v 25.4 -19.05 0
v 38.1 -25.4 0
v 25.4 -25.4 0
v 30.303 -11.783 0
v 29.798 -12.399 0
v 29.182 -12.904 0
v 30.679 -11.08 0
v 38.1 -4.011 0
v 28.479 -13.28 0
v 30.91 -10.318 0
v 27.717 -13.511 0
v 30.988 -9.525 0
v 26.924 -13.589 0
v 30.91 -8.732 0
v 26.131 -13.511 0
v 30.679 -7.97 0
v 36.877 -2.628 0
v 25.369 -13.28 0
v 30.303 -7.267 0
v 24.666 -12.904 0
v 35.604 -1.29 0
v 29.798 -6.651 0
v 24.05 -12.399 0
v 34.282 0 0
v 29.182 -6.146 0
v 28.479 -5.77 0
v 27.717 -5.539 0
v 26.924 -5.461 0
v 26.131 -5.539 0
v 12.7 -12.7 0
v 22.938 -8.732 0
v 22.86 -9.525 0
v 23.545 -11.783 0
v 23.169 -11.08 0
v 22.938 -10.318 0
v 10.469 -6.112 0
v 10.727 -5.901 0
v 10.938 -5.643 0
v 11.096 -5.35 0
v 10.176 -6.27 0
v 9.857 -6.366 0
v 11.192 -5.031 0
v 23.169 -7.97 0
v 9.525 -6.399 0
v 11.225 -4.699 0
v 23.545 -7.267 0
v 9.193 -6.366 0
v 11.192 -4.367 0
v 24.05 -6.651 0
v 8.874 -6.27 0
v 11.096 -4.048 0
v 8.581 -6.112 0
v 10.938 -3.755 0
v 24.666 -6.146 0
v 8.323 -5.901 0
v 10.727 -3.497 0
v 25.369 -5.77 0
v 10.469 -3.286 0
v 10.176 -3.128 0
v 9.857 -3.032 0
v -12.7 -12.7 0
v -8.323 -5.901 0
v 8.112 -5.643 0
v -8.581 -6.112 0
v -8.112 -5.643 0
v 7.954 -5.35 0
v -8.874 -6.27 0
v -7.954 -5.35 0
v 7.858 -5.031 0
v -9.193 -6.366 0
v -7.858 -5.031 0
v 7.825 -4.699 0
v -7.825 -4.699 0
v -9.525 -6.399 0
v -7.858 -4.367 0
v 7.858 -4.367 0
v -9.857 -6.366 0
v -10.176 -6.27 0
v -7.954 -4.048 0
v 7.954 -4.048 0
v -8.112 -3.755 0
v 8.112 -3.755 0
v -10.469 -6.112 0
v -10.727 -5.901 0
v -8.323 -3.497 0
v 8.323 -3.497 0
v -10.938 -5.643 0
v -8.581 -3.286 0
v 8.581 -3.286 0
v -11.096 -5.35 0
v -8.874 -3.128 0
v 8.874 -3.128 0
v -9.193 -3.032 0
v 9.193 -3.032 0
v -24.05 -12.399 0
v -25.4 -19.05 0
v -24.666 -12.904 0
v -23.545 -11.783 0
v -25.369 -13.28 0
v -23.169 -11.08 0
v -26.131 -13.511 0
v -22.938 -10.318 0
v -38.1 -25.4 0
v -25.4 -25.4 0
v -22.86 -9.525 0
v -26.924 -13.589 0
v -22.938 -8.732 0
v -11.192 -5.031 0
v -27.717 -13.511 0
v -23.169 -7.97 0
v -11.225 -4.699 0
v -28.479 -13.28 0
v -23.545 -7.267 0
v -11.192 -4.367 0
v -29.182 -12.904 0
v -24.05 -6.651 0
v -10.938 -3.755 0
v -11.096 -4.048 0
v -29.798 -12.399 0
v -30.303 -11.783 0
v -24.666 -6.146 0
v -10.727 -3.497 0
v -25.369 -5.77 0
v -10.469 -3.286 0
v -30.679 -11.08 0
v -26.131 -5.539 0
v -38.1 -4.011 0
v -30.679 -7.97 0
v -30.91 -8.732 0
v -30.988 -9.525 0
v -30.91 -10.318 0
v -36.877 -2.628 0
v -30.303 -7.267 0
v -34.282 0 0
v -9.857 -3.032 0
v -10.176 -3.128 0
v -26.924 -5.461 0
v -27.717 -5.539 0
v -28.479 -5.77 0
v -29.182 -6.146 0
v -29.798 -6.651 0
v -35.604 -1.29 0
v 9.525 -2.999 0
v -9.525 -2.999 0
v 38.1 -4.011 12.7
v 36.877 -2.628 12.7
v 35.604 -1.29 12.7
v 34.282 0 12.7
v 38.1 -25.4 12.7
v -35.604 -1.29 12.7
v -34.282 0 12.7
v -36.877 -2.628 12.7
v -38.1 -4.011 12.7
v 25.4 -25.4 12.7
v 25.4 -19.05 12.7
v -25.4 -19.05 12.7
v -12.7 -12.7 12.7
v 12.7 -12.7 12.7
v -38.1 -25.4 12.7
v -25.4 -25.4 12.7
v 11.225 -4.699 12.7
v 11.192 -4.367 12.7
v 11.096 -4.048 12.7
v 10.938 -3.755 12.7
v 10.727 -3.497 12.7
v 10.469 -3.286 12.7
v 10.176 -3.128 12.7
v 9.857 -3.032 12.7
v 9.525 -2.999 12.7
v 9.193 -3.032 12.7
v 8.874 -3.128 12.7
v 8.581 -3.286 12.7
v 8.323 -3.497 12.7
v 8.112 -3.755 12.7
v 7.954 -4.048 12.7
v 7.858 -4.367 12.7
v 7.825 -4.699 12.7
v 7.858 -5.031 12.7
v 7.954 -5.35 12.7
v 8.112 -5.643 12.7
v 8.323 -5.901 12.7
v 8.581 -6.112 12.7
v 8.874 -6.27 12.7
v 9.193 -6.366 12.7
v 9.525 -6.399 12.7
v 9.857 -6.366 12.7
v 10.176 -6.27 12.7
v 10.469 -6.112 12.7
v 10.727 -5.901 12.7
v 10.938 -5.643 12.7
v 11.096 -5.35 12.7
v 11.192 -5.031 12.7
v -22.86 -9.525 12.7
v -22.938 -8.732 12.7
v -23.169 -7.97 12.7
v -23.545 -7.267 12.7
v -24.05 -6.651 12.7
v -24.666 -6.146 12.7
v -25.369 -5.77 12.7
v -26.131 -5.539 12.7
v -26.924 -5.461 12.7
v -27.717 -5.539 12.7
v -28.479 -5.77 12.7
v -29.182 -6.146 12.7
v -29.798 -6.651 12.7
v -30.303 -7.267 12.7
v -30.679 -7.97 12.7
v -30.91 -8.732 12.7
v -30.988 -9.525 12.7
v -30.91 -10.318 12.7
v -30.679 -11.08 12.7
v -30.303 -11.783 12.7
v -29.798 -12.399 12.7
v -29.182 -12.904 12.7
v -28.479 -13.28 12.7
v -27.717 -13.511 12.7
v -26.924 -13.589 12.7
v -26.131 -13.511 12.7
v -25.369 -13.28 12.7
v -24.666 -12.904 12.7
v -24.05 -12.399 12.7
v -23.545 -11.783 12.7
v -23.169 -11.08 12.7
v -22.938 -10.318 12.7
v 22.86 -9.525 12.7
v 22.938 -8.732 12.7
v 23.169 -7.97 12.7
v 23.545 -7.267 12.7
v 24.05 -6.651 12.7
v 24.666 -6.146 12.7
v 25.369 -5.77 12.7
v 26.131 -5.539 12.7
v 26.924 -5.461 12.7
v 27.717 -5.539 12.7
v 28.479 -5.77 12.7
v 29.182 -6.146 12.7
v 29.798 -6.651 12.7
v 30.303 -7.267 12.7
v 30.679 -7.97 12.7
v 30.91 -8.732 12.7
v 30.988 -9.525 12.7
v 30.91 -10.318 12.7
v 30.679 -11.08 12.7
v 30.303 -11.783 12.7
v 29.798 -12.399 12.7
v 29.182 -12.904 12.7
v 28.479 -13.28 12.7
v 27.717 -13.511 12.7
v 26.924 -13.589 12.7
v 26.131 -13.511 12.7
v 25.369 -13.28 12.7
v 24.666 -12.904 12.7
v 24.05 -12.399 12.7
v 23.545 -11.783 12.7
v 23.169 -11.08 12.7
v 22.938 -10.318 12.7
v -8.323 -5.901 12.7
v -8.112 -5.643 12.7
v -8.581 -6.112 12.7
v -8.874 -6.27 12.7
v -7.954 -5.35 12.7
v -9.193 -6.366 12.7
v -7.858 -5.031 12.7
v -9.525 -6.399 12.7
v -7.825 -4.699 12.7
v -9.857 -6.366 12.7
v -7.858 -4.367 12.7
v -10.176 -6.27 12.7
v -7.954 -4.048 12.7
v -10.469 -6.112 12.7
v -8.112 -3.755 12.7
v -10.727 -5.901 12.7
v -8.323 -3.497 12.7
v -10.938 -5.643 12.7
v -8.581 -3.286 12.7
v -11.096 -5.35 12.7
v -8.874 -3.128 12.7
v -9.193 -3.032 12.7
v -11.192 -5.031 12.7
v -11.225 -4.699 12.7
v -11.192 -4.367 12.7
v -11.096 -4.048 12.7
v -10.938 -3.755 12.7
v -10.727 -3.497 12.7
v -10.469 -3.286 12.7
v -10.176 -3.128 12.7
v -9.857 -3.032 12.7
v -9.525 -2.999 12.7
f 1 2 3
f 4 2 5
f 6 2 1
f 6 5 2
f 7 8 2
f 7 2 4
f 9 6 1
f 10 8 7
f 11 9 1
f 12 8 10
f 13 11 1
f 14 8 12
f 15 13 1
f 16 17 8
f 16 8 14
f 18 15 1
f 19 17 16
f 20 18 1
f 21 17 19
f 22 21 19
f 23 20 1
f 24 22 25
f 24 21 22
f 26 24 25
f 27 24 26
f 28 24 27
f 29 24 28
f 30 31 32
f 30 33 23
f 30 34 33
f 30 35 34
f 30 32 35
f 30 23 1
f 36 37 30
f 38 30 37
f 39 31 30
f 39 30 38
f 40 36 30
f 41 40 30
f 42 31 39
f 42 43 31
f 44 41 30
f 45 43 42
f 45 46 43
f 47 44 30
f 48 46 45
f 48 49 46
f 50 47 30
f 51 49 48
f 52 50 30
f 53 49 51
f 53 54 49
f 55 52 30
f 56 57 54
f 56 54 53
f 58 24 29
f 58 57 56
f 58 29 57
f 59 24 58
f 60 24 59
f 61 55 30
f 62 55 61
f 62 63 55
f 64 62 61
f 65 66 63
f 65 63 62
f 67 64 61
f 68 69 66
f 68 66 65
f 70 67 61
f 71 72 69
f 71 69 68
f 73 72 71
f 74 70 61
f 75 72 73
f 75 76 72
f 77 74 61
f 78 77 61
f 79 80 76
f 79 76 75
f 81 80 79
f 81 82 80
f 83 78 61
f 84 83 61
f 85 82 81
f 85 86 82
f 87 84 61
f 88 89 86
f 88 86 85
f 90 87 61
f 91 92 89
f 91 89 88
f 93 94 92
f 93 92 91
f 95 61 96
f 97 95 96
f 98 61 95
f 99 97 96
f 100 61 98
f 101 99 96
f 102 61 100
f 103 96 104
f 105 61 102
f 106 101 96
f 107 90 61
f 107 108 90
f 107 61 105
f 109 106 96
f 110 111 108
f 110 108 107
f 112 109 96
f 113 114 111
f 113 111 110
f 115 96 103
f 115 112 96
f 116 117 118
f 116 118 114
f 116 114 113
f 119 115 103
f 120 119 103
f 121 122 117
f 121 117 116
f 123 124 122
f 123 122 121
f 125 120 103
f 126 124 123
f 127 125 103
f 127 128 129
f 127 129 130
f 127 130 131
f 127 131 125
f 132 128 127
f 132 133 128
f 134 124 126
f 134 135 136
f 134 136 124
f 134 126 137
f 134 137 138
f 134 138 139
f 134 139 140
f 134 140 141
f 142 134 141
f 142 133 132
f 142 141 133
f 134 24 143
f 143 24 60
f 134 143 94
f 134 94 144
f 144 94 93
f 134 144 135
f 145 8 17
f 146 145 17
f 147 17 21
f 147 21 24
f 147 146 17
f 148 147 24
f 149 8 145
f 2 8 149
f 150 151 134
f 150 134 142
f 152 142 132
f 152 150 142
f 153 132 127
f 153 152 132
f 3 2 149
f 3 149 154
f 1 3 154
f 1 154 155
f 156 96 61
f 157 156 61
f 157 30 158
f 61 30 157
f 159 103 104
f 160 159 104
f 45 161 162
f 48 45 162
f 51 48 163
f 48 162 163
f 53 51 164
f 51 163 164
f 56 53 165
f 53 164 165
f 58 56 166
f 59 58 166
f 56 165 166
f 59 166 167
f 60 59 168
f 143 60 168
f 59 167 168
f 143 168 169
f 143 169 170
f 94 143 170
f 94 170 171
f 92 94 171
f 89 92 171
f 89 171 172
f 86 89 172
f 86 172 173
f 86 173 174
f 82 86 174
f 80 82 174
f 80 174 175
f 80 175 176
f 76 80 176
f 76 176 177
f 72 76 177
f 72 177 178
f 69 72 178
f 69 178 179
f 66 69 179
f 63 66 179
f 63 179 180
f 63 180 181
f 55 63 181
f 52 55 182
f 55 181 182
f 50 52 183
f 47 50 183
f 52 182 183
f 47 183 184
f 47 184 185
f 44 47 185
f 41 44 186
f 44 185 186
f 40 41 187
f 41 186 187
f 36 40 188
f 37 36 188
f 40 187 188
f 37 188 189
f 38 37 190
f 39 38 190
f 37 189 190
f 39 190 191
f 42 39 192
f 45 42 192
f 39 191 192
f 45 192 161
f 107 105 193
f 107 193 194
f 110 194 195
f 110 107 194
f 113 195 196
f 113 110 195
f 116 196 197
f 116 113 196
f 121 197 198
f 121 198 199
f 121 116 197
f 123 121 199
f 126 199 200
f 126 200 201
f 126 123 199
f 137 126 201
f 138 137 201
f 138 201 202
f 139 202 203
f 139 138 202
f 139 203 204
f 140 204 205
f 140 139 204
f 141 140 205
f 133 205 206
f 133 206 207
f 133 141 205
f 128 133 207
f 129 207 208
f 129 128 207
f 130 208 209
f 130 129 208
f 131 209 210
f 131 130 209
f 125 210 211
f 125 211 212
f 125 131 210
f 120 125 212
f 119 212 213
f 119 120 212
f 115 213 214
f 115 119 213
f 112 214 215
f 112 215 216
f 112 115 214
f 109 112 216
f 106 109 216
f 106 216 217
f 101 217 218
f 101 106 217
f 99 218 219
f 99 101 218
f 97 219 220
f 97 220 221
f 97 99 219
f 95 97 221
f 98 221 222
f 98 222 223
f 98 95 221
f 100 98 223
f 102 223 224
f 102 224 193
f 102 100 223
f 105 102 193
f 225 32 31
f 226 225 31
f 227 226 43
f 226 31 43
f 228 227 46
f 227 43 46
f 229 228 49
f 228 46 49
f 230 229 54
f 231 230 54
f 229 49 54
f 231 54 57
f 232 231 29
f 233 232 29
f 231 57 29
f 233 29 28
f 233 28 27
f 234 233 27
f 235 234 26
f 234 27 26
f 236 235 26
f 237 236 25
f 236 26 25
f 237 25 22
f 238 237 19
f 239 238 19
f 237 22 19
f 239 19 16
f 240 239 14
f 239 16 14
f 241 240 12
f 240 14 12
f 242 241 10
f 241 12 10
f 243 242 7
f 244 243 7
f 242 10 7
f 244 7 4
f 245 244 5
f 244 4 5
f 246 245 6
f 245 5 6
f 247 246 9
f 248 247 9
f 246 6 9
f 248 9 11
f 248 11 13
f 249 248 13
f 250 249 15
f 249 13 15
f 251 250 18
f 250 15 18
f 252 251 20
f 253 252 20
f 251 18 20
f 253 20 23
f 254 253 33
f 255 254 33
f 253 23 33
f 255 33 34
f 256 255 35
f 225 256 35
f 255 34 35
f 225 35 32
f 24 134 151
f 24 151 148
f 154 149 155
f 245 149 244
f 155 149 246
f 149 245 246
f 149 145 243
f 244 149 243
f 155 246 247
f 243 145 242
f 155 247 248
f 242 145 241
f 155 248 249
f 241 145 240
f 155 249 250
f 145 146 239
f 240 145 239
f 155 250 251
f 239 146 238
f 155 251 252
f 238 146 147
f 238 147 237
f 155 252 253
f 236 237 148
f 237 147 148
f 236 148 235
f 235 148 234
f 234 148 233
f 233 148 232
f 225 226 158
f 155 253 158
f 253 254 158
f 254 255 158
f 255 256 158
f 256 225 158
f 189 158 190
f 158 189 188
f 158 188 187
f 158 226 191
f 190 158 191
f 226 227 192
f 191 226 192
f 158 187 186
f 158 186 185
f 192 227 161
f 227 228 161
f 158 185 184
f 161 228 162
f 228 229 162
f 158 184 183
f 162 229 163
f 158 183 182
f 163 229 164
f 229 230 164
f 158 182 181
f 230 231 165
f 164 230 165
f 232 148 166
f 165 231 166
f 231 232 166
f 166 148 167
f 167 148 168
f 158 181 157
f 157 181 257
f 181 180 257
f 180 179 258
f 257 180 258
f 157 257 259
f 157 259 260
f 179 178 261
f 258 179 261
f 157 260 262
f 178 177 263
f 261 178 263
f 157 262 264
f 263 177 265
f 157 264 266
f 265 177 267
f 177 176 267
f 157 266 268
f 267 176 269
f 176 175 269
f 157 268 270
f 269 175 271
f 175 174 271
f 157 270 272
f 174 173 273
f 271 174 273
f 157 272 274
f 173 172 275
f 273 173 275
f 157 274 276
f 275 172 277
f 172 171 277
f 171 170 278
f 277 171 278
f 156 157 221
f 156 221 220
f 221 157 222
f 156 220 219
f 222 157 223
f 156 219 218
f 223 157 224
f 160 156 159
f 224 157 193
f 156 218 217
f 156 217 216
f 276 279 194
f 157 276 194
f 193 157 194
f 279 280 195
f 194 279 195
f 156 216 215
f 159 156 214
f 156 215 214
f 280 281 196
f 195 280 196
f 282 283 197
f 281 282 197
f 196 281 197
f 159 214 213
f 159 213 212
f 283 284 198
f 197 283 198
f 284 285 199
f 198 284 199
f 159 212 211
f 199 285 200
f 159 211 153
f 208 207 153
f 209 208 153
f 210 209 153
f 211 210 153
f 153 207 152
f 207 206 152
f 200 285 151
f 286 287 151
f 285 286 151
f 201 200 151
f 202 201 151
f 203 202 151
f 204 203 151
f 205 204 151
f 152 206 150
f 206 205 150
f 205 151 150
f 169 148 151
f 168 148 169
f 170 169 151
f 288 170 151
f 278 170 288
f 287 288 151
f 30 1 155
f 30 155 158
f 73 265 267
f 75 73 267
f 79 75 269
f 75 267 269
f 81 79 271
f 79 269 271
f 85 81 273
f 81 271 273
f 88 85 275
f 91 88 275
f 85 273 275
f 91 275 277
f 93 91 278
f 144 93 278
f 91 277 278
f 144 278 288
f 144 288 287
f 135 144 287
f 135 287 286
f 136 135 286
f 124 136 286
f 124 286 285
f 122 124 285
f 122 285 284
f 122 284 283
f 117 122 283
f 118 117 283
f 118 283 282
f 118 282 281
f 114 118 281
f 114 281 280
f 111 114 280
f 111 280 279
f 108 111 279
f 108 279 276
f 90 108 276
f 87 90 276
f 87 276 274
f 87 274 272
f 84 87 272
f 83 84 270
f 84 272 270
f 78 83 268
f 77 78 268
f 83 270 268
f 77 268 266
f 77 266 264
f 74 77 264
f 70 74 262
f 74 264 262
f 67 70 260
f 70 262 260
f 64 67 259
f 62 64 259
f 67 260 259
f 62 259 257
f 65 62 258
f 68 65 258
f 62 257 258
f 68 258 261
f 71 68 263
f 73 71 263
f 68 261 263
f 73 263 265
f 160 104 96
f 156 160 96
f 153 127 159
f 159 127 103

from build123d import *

# Parameters (mm, degrees)
SKETCH1_R           = 4.064
BOSS_EXTRUDE1_DEPTH = 12.7
SKETCH2_R           = 1.6999966
SKETCH2_R_2         = 1.7
CUT_EXTRUDE1_DEPTH  = 48.519048812


with BuildPart() as part:
    # Sketch1 → Boss-Extrude1 (new body)
    with BuildSketch(Plane.XY):
        Polygon((0, 0), (-38.1, 0), (-38.1, -25.4), (-25.4, -25.4), (-25.4, -19.05), (-12.7, -12.7), (0, -12.7), align=None)
        with Locations((-26.924, -9.525)):
            Circle(SKETCH1_R, mode=Mode.SUBTRACT)
    boss_extrude1 = extrude(amount=BOSS_EXTRUDE1_DEPTH)

    # Mirror1: Boss-Extrude1 across plane
    add(boss_extrude1.mirror(Plane(origin=(0, -12.7, 12.7), x_dir=(0, 0, 1), z_dir=(-1, 0, 0))))

    # Sketch2 → Cut-Extrude1 (cut, through all)
    with BuildSketch(Plane.XY.offset(12.7)):
        with Locations((-9.525, -4.699)):
            Circle(SKETCH2_R)
        with Locations((9.525, -4.699)):
            Circle(SKETCH2_R_2)
        with BuildLine():
            Line((-38.1, -4.011499418), (-38.1, 0))
            Line((-38.1, 0), (-34.28223801, 0))
            ThreePointArc((-34.28223801, 0), (-36.246656766, -1.952894173), (-38.1, -4.011499418))
        make_face()
        with BuildLine():
            Line((34.28223801, 0), (38.1, 0))
            Line((38.1, 0), (38.1, -4.011499418))
            ThreePointArc((38.1, -4.011499418), (36.246656766, -1.952894173), (34.28223801, 0))
        make_face()
    extrude(amount=-CUT_EXTRUDE1_DEPTH, mode=Mode.SUBTRACT)


solid = part.part
